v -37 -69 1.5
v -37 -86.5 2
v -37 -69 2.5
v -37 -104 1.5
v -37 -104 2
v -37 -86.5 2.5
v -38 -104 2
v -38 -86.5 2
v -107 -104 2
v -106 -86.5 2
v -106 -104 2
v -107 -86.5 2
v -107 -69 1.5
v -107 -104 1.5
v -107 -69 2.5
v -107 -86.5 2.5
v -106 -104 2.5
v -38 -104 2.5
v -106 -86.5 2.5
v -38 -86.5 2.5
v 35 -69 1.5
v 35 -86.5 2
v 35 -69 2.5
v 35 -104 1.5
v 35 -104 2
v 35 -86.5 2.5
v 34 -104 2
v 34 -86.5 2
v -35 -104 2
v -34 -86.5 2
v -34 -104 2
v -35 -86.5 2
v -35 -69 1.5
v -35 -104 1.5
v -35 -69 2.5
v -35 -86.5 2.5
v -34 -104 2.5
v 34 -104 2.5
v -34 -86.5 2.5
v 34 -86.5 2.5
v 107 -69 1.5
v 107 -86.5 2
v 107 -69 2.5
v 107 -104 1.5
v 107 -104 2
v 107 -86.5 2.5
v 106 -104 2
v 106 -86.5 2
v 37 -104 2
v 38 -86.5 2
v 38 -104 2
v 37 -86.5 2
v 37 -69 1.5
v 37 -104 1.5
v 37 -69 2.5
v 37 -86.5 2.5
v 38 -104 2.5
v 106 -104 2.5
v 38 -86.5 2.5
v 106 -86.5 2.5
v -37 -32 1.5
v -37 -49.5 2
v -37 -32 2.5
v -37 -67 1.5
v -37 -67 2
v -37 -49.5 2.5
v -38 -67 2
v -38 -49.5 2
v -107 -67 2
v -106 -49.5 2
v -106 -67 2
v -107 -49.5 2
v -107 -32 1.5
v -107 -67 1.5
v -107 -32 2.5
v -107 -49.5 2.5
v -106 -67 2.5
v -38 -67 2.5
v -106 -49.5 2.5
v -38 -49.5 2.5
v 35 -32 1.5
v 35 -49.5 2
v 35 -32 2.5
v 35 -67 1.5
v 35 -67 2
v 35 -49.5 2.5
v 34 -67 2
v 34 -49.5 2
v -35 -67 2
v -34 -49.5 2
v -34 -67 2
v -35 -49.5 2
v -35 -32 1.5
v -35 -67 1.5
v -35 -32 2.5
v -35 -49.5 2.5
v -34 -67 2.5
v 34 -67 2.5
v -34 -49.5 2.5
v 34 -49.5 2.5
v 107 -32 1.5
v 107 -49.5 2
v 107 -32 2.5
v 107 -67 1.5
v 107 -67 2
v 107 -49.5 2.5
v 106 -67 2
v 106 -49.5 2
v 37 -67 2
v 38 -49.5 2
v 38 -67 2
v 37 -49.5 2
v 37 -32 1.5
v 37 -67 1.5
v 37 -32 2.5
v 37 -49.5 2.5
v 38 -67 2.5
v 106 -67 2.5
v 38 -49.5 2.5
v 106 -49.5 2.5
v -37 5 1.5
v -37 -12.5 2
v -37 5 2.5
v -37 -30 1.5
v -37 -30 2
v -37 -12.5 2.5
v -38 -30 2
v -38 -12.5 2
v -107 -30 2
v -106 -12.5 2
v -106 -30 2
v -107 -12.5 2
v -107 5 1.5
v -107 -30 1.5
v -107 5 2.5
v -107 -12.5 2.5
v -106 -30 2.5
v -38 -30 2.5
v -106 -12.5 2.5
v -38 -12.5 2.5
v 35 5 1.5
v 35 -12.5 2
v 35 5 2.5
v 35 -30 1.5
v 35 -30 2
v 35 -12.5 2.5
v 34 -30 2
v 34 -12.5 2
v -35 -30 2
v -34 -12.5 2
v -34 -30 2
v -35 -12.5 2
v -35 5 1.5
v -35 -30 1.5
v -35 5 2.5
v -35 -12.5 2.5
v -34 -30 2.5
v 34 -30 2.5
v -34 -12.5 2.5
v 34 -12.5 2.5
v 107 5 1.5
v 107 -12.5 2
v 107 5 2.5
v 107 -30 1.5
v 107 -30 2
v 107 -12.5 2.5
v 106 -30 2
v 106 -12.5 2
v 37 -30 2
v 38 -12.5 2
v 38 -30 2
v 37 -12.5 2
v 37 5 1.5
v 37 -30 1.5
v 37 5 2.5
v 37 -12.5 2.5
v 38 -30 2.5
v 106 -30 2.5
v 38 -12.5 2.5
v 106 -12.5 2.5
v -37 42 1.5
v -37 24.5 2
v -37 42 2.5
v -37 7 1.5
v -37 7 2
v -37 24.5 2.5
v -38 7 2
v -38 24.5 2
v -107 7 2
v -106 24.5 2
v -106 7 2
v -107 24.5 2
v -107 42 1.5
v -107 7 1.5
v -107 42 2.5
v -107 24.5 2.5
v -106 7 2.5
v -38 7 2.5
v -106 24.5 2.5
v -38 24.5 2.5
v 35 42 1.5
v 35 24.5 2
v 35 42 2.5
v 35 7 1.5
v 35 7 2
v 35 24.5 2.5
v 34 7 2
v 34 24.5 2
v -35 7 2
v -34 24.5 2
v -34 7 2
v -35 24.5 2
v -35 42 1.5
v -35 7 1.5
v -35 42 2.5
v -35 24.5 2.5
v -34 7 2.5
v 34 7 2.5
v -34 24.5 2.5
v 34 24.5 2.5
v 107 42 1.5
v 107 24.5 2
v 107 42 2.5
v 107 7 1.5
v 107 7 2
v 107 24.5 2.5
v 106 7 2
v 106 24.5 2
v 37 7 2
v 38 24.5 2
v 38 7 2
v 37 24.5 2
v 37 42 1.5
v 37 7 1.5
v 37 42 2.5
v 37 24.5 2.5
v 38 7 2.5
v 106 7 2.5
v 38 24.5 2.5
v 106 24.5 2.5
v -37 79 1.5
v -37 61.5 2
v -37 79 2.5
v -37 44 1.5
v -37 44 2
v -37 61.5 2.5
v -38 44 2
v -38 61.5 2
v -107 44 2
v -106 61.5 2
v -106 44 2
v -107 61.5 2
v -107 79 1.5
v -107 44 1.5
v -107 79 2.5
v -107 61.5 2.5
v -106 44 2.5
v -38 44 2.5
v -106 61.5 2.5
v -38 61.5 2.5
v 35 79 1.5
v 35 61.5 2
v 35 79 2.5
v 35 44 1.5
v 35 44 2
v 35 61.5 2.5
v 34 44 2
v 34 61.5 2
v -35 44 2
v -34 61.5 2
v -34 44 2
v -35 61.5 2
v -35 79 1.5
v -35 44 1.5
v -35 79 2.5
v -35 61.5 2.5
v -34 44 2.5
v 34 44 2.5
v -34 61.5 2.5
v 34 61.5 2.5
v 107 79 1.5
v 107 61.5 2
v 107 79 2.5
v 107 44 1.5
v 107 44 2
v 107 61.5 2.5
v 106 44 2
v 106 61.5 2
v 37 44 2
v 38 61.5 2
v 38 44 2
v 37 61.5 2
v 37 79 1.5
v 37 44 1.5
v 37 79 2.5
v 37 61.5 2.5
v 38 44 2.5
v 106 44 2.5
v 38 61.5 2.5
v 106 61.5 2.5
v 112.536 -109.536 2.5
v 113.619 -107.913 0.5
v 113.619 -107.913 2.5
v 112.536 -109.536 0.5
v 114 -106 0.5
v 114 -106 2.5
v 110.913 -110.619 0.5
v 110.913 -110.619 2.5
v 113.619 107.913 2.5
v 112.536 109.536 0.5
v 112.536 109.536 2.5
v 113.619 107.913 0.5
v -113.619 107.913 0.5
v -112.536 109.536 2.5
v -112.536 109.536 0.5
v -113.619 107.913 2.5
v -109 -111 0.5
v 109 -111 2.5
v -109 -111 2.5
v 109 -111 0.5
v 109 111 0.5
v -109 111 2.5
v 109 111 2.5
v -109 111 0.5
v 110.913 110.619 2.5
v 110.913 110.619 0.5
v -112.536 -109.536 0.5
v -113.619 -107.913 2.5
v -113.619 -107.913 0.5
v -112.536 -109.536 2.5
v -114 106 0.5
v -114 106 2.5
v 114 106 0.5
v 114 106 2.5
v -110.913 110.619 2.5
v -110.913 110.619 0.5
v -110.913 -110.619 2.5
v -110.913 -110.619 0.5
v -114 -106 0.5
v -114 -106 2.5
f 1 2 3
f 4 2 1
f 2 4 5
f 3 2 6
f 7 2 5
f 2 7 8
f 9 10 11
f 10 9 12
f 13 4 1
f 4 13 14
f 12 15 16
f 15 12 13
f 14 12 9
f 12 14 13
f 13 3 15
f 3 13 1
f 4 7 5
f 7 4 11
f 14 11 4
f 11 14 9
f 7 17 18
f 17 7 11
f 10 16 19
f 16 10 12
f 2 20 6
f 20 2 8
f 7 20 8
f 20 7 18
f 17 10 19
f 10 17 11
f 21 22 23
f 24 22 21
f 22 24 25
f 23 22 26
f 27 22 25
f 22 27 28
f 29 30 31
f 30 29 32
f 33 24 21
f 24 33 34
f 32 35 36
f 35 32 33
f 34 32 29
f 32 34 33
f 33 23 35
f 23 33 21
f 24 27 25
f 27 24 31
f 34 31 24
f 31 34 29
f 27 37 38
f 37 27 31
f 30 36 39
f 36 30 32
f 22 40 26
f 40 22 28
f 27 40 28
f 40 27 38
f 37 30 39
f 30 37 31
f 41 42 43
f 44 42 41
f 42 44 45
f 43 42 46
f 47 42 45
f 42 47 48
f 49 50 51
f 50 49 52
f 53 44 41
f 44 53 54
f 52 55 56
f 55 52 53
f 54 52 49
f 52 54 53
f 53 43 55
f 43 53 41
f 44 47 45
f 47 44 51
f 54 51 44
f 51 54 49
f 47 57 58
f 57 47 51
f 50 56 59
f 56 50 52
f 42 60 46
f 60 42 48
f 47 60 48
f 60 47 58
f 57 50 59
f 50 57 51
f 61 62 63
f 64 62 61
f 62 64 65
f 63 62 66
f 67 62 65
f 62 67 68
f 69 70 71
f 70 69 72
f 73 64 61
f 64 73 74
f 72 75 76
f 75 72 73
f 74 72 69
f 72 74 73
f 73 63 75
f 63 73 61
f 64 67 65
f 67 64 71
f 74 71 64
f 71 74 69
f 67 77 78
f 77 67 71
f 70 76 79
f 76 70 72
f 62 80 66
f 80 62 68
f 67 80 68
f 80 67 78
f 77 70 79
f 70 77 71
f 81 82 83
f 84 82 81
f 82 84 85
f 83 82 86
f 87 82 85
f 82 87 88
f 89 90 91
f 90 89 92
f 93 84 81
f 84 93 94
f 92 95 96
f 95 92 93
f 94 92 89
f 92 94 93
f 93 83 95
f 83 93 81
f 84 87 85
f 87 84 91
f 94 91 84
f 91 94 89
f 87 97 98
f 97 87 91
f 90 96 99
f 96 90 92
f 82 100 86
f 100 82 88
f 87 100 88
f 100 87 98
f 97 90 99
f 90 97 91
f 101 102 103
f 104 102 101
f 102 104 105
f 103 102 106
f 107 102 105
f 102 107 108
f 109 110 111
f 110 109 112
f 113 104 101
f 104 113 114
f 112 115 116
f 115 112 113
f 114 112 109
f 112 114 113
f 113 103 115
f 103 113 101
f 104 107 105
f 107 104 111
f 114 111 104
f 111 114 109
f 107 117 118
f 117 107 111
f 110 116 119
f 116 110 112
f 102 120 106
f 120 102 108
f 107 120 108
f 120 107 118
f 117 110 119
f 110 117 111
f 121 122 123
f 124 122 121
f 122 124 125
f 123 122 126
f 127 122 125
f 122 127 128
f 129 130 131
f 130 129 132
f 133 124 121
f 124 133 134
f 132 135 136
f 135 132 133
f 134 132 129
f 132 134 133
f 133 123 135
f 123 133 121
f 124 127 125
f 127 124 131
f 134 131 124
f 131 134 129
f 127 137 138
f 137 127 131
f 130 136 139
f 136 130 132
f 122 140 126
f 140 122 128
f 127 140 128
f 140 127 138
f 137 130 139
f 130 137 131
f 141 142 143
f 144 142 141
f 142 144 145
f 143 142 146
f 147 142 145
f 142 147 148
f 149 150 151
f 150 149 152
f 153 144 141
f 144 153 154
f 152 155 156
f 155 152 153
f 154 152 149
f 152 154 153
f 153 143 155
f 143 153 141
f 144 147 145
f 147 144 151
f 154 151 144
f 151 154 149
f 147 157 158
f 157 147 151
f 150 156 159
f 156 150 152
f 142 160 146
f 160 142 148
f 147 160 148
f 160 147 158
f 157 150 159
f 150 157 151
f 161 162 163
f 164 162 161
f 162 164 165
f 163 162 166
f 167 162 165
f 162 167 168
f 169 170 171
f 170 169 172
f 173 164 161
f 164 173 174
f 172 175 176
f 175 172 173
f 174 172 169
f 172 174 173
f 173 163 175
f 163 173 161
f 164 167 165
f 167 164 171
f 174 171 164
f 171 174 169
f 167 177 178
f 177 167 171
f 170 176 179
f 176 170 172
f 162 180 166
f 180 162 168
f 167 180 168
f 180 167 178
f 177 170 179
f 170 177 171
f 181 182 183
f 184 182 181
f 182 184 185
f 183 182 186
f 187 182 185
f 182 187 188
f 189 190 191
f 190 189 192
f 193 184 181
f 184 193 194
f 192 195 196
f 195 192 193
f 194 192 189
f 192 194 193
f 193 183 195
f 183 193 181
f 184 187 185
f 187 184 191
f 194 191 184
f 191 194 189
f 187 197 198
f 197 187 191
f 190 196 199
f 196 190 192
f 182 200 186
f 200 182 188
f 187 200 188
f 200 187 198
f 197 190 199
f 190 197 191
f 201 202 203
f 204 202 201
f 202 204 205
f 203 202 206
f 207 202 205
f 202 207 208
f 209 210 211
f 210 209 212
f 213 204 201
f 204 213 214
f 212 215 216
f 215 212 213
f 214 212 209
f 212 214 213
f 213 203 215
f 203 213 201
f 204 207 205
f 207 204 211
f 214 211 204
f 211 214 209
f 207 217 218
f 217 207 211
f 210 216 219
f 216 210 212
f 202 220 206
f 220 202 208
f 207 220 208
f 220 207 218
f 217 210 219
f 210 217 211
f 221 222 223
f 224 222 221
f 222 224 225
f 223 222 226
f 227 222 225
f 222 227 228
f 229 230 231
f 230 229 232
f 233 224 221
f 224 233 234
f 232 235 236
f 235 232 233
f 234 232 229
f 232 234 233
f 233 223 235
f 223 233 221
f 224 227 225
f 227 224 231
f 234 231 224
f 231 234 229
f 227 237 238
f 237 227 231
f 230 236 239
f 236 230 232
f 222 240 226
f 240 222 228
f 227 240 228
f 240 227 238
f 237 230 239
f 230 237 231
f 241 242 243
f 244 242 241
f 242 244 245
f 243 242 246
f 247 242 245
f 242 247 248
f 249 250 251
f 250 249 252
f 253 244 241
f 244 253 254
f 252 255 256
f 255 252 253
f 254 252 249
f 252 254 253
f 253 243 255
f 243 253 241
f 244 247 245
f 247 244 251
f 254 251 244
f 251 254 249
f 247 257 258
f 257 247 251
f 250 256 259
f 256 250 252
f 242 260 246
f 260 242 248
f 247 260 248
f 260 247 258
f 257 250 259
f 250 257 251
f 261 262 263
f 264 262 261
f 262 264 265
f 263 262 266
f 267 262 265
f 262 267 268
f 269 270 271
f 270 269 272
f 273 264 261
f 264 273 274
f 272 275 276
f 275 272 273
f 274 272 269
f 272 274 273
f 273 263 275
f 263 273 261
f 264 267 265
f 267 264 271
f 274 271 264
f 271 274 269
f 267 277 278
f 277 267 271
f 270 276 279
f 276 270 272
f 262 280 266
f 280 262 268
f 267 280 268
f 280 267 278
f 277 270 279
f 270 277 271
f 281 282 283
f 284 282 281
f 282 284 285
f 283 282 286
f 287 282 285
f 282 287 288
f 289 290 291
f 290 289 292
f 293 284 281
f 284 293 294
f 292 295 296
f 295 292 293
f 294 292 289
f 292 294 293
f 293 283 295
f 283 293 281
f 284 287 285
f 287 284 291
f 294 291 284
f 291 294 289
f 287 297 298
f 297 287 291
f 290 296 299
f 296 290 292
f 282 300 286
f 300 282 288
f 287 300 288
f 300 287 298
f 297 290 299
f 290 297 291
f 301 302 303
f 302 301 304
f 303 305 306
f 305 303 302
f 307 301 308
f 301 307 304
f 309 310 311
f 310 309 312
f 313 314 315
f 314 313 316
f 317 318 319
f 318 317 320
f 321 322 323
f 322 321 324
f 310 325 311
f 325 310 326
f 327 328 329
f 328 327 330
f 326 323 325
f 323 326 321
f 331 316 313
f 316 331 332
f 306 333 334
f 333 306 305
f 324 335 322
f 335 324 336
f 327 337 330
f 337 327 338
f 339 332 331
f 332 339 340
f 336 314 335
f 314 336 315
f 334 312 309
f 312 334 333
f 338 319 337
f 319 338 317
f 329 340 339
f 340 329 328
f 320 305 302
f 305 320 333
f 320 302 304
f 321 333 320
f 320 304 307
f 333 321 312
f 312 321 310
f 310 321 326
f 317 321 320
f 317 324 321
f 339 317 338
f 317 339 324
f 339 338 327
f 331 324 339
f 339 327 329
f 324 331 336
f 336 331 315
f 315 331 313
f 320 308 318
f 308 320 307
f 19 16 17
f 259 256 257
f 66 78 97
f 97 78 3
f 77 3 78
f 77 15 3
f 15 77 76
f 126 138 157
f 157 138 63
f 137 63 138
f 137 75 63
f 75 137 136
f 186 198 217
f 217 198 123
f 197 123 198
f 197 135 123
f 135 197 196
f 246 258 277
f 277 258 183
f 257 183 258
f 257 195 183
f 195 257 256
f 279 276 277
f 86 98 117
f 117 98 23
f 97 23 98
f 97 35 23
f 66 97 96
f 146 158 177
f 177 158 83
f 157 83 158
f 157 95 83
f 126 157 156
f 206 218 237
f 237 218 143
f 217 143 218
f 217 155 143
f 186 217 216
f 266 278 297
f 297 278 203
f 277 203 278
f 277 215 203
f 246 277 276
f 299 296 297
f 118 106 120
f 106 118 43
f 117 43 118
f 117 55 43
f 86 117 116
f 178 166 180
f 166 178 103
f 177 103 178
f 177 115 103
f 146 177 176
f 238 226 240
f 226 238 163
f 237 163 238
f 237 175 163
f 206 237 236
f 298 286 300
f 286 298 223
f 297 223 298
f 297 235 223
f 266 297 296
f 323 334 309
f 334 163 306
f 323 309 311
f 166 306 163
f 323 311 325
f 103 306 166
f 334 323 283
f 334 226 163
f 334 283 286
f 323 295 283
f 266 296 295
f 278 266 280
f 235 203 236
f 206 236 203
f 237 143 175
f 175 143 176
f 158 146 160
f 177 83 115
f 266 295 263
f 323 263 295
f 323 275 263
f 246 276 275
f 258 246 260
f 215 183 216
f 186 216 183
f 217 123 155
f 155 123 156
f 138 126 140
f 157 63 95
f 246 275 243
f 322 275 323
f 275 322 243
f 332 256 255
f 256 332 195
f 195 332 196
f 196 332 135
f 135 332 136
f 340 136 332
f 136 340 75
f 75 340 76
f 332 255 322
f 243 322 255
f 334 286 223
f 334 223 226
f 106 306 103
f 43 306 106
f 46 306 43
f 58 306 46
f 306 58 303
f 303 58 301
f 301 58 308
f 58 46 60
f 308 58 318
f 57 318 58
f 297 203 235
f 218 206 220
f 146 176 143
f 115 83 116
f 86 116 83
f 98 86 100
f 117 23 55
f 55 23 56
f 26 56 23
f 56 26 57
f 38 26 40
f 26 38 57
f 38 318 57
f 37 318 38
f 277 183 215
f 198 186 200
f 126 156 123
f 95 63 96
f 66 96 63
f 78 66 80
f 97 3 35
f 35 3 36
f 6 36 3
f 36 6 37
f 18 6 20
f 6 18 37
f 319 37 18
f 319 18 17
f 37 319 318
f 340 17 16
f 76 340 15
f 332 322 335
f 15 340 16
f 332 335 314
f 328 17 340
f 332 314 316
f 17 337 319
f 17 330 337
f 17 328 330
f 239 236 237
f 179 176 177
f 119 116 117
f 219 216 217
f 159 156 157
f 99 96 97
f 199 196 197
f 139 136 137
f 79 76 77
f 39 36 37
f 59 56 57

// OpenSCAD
// Global Parameters
label_width   = 70;
label_height  = 35;
labels_across =  3;
labels_down   =  5;
padding       =  2;
thickness     =  2;
roundedness   =  5;
overlap       =  2;
header        = 25;

// Derived Parameters
width = labels_across * (label_width + padding) + padding;
height = labels_down * (label_height + padding) + padding + header;

module priceholder() {

    difference() {

        // Things that exist
        union() {
            translate( v = [0, 0, thickness/2] ) {
                minkowski() {
                    cube( size = [width, height, thickness/2], center = true );
                    cylinder( h = thickness/2, r = roundedness );
                }
            }
        }

        // Things to be cut out
        union() {
            translate( v = [-52, height/2-header, thickness] ) {
                scale( v = [4, 4, 0] ) {
                    linear_extrude(height=thickness, convexity = 1) import("tridentlogo.dxf");
                }
            }
            for ( y = [1 : labels_down] ) {
                for ( x = [1 : labels_across] ) {
                    translate( v = [
                                    (x - labels_across/2) * (label_width + padding) - (label_width + padding)/2,
                                    (y - labels_down/2) * (label_height + padding) - (label_height + padding)/2 - header/2, 
                                    thickness
                                    ] ){
                        translate( v = [0, 0, -thickness/8] ) {
                            cube( size = [label_width, label_height, thickness/4], center = true );
                        }
                        translate( v = [0, label_height/4, thickness/2] ) { 
                            cube( size = [label_width, label_height/2, thickness], center = true );
                        }
                        translate( v = [0, -label_height/4, thickness/2] ) { 
                            cube( size = [label_width - overlap, label_height/2, thickness], center = true );
                        }
                    }
                }
            }
        }
    }

}

priceholder();


// http://en.wikibooks.org/wiki/OpenSCAD_User_Manual

// primitives
// cube(size = [1,2,3], center = true);
// sphere( r = 10, $fn=100 );
// circle( r = 10 );
// cylinder( h = 10, r = 20, $fs = 6, center = true );
// cylinder( h = 10, r1 = 10, r2 = 20, $fs = 6, center = false );
// polyhedron(points = [ [x, y, z], ... ], triangles = [ [p1, p2, p3..], ... ], convexity = N);
// polygon(points = [ [x, y], ... ], paths = [ [p1, p2, p3..], ... ], convexity = N);

// transormations
// scale(v = [x, y, z]) { ... }
// rotate(a=[0,180,0]) { ... }
// translate(v = [x, y, z]) { ... }
// mirror([ 0, 1, 0 ]) { ... }

// rounded box by combining a cube and single cylinder
// $fn=50;
// minkowski() {
//   cube([10,10,1]);
//   cylinder(r=2,h=1);
// }

// hull() {
//   translate([15,10,0]) circle(10);
//   circle(10);
// }

// dxf_linear_extrude(file="tridentlogo.dxf", height = 1, center = false, convexity = 10);
// deprecated - import_dxf(file="design.dxf", layer="layername", origin = [100,100], scale = 0.5);
// linear_extrude(height = 10, center = true, convexity = 10, twist = 0, $fn = 100)
// rotate_extrude(convexity = 10, $fn = 100)
// import_stl("example012.stl", convexity = 5);

// for (z = [-1, 1] ) { ... } // two iterations, z = -1, z = 1
// for (z = [ 0 : 5 ] ) { ... } // range of interations step 1
// for (z = [ 0 : 2 : 5 ] ) { ... } // range of interations step 2

// for (i = [ [ 0, 0, 0 ], [...] ] ) { ... } // range of rotations or vectors
// usage say rotate($i) or translate($i)
// if ( x > y ) { ... } else { ... }
// assign (angle = i*360/20, distance = i*10, r = i*2)
